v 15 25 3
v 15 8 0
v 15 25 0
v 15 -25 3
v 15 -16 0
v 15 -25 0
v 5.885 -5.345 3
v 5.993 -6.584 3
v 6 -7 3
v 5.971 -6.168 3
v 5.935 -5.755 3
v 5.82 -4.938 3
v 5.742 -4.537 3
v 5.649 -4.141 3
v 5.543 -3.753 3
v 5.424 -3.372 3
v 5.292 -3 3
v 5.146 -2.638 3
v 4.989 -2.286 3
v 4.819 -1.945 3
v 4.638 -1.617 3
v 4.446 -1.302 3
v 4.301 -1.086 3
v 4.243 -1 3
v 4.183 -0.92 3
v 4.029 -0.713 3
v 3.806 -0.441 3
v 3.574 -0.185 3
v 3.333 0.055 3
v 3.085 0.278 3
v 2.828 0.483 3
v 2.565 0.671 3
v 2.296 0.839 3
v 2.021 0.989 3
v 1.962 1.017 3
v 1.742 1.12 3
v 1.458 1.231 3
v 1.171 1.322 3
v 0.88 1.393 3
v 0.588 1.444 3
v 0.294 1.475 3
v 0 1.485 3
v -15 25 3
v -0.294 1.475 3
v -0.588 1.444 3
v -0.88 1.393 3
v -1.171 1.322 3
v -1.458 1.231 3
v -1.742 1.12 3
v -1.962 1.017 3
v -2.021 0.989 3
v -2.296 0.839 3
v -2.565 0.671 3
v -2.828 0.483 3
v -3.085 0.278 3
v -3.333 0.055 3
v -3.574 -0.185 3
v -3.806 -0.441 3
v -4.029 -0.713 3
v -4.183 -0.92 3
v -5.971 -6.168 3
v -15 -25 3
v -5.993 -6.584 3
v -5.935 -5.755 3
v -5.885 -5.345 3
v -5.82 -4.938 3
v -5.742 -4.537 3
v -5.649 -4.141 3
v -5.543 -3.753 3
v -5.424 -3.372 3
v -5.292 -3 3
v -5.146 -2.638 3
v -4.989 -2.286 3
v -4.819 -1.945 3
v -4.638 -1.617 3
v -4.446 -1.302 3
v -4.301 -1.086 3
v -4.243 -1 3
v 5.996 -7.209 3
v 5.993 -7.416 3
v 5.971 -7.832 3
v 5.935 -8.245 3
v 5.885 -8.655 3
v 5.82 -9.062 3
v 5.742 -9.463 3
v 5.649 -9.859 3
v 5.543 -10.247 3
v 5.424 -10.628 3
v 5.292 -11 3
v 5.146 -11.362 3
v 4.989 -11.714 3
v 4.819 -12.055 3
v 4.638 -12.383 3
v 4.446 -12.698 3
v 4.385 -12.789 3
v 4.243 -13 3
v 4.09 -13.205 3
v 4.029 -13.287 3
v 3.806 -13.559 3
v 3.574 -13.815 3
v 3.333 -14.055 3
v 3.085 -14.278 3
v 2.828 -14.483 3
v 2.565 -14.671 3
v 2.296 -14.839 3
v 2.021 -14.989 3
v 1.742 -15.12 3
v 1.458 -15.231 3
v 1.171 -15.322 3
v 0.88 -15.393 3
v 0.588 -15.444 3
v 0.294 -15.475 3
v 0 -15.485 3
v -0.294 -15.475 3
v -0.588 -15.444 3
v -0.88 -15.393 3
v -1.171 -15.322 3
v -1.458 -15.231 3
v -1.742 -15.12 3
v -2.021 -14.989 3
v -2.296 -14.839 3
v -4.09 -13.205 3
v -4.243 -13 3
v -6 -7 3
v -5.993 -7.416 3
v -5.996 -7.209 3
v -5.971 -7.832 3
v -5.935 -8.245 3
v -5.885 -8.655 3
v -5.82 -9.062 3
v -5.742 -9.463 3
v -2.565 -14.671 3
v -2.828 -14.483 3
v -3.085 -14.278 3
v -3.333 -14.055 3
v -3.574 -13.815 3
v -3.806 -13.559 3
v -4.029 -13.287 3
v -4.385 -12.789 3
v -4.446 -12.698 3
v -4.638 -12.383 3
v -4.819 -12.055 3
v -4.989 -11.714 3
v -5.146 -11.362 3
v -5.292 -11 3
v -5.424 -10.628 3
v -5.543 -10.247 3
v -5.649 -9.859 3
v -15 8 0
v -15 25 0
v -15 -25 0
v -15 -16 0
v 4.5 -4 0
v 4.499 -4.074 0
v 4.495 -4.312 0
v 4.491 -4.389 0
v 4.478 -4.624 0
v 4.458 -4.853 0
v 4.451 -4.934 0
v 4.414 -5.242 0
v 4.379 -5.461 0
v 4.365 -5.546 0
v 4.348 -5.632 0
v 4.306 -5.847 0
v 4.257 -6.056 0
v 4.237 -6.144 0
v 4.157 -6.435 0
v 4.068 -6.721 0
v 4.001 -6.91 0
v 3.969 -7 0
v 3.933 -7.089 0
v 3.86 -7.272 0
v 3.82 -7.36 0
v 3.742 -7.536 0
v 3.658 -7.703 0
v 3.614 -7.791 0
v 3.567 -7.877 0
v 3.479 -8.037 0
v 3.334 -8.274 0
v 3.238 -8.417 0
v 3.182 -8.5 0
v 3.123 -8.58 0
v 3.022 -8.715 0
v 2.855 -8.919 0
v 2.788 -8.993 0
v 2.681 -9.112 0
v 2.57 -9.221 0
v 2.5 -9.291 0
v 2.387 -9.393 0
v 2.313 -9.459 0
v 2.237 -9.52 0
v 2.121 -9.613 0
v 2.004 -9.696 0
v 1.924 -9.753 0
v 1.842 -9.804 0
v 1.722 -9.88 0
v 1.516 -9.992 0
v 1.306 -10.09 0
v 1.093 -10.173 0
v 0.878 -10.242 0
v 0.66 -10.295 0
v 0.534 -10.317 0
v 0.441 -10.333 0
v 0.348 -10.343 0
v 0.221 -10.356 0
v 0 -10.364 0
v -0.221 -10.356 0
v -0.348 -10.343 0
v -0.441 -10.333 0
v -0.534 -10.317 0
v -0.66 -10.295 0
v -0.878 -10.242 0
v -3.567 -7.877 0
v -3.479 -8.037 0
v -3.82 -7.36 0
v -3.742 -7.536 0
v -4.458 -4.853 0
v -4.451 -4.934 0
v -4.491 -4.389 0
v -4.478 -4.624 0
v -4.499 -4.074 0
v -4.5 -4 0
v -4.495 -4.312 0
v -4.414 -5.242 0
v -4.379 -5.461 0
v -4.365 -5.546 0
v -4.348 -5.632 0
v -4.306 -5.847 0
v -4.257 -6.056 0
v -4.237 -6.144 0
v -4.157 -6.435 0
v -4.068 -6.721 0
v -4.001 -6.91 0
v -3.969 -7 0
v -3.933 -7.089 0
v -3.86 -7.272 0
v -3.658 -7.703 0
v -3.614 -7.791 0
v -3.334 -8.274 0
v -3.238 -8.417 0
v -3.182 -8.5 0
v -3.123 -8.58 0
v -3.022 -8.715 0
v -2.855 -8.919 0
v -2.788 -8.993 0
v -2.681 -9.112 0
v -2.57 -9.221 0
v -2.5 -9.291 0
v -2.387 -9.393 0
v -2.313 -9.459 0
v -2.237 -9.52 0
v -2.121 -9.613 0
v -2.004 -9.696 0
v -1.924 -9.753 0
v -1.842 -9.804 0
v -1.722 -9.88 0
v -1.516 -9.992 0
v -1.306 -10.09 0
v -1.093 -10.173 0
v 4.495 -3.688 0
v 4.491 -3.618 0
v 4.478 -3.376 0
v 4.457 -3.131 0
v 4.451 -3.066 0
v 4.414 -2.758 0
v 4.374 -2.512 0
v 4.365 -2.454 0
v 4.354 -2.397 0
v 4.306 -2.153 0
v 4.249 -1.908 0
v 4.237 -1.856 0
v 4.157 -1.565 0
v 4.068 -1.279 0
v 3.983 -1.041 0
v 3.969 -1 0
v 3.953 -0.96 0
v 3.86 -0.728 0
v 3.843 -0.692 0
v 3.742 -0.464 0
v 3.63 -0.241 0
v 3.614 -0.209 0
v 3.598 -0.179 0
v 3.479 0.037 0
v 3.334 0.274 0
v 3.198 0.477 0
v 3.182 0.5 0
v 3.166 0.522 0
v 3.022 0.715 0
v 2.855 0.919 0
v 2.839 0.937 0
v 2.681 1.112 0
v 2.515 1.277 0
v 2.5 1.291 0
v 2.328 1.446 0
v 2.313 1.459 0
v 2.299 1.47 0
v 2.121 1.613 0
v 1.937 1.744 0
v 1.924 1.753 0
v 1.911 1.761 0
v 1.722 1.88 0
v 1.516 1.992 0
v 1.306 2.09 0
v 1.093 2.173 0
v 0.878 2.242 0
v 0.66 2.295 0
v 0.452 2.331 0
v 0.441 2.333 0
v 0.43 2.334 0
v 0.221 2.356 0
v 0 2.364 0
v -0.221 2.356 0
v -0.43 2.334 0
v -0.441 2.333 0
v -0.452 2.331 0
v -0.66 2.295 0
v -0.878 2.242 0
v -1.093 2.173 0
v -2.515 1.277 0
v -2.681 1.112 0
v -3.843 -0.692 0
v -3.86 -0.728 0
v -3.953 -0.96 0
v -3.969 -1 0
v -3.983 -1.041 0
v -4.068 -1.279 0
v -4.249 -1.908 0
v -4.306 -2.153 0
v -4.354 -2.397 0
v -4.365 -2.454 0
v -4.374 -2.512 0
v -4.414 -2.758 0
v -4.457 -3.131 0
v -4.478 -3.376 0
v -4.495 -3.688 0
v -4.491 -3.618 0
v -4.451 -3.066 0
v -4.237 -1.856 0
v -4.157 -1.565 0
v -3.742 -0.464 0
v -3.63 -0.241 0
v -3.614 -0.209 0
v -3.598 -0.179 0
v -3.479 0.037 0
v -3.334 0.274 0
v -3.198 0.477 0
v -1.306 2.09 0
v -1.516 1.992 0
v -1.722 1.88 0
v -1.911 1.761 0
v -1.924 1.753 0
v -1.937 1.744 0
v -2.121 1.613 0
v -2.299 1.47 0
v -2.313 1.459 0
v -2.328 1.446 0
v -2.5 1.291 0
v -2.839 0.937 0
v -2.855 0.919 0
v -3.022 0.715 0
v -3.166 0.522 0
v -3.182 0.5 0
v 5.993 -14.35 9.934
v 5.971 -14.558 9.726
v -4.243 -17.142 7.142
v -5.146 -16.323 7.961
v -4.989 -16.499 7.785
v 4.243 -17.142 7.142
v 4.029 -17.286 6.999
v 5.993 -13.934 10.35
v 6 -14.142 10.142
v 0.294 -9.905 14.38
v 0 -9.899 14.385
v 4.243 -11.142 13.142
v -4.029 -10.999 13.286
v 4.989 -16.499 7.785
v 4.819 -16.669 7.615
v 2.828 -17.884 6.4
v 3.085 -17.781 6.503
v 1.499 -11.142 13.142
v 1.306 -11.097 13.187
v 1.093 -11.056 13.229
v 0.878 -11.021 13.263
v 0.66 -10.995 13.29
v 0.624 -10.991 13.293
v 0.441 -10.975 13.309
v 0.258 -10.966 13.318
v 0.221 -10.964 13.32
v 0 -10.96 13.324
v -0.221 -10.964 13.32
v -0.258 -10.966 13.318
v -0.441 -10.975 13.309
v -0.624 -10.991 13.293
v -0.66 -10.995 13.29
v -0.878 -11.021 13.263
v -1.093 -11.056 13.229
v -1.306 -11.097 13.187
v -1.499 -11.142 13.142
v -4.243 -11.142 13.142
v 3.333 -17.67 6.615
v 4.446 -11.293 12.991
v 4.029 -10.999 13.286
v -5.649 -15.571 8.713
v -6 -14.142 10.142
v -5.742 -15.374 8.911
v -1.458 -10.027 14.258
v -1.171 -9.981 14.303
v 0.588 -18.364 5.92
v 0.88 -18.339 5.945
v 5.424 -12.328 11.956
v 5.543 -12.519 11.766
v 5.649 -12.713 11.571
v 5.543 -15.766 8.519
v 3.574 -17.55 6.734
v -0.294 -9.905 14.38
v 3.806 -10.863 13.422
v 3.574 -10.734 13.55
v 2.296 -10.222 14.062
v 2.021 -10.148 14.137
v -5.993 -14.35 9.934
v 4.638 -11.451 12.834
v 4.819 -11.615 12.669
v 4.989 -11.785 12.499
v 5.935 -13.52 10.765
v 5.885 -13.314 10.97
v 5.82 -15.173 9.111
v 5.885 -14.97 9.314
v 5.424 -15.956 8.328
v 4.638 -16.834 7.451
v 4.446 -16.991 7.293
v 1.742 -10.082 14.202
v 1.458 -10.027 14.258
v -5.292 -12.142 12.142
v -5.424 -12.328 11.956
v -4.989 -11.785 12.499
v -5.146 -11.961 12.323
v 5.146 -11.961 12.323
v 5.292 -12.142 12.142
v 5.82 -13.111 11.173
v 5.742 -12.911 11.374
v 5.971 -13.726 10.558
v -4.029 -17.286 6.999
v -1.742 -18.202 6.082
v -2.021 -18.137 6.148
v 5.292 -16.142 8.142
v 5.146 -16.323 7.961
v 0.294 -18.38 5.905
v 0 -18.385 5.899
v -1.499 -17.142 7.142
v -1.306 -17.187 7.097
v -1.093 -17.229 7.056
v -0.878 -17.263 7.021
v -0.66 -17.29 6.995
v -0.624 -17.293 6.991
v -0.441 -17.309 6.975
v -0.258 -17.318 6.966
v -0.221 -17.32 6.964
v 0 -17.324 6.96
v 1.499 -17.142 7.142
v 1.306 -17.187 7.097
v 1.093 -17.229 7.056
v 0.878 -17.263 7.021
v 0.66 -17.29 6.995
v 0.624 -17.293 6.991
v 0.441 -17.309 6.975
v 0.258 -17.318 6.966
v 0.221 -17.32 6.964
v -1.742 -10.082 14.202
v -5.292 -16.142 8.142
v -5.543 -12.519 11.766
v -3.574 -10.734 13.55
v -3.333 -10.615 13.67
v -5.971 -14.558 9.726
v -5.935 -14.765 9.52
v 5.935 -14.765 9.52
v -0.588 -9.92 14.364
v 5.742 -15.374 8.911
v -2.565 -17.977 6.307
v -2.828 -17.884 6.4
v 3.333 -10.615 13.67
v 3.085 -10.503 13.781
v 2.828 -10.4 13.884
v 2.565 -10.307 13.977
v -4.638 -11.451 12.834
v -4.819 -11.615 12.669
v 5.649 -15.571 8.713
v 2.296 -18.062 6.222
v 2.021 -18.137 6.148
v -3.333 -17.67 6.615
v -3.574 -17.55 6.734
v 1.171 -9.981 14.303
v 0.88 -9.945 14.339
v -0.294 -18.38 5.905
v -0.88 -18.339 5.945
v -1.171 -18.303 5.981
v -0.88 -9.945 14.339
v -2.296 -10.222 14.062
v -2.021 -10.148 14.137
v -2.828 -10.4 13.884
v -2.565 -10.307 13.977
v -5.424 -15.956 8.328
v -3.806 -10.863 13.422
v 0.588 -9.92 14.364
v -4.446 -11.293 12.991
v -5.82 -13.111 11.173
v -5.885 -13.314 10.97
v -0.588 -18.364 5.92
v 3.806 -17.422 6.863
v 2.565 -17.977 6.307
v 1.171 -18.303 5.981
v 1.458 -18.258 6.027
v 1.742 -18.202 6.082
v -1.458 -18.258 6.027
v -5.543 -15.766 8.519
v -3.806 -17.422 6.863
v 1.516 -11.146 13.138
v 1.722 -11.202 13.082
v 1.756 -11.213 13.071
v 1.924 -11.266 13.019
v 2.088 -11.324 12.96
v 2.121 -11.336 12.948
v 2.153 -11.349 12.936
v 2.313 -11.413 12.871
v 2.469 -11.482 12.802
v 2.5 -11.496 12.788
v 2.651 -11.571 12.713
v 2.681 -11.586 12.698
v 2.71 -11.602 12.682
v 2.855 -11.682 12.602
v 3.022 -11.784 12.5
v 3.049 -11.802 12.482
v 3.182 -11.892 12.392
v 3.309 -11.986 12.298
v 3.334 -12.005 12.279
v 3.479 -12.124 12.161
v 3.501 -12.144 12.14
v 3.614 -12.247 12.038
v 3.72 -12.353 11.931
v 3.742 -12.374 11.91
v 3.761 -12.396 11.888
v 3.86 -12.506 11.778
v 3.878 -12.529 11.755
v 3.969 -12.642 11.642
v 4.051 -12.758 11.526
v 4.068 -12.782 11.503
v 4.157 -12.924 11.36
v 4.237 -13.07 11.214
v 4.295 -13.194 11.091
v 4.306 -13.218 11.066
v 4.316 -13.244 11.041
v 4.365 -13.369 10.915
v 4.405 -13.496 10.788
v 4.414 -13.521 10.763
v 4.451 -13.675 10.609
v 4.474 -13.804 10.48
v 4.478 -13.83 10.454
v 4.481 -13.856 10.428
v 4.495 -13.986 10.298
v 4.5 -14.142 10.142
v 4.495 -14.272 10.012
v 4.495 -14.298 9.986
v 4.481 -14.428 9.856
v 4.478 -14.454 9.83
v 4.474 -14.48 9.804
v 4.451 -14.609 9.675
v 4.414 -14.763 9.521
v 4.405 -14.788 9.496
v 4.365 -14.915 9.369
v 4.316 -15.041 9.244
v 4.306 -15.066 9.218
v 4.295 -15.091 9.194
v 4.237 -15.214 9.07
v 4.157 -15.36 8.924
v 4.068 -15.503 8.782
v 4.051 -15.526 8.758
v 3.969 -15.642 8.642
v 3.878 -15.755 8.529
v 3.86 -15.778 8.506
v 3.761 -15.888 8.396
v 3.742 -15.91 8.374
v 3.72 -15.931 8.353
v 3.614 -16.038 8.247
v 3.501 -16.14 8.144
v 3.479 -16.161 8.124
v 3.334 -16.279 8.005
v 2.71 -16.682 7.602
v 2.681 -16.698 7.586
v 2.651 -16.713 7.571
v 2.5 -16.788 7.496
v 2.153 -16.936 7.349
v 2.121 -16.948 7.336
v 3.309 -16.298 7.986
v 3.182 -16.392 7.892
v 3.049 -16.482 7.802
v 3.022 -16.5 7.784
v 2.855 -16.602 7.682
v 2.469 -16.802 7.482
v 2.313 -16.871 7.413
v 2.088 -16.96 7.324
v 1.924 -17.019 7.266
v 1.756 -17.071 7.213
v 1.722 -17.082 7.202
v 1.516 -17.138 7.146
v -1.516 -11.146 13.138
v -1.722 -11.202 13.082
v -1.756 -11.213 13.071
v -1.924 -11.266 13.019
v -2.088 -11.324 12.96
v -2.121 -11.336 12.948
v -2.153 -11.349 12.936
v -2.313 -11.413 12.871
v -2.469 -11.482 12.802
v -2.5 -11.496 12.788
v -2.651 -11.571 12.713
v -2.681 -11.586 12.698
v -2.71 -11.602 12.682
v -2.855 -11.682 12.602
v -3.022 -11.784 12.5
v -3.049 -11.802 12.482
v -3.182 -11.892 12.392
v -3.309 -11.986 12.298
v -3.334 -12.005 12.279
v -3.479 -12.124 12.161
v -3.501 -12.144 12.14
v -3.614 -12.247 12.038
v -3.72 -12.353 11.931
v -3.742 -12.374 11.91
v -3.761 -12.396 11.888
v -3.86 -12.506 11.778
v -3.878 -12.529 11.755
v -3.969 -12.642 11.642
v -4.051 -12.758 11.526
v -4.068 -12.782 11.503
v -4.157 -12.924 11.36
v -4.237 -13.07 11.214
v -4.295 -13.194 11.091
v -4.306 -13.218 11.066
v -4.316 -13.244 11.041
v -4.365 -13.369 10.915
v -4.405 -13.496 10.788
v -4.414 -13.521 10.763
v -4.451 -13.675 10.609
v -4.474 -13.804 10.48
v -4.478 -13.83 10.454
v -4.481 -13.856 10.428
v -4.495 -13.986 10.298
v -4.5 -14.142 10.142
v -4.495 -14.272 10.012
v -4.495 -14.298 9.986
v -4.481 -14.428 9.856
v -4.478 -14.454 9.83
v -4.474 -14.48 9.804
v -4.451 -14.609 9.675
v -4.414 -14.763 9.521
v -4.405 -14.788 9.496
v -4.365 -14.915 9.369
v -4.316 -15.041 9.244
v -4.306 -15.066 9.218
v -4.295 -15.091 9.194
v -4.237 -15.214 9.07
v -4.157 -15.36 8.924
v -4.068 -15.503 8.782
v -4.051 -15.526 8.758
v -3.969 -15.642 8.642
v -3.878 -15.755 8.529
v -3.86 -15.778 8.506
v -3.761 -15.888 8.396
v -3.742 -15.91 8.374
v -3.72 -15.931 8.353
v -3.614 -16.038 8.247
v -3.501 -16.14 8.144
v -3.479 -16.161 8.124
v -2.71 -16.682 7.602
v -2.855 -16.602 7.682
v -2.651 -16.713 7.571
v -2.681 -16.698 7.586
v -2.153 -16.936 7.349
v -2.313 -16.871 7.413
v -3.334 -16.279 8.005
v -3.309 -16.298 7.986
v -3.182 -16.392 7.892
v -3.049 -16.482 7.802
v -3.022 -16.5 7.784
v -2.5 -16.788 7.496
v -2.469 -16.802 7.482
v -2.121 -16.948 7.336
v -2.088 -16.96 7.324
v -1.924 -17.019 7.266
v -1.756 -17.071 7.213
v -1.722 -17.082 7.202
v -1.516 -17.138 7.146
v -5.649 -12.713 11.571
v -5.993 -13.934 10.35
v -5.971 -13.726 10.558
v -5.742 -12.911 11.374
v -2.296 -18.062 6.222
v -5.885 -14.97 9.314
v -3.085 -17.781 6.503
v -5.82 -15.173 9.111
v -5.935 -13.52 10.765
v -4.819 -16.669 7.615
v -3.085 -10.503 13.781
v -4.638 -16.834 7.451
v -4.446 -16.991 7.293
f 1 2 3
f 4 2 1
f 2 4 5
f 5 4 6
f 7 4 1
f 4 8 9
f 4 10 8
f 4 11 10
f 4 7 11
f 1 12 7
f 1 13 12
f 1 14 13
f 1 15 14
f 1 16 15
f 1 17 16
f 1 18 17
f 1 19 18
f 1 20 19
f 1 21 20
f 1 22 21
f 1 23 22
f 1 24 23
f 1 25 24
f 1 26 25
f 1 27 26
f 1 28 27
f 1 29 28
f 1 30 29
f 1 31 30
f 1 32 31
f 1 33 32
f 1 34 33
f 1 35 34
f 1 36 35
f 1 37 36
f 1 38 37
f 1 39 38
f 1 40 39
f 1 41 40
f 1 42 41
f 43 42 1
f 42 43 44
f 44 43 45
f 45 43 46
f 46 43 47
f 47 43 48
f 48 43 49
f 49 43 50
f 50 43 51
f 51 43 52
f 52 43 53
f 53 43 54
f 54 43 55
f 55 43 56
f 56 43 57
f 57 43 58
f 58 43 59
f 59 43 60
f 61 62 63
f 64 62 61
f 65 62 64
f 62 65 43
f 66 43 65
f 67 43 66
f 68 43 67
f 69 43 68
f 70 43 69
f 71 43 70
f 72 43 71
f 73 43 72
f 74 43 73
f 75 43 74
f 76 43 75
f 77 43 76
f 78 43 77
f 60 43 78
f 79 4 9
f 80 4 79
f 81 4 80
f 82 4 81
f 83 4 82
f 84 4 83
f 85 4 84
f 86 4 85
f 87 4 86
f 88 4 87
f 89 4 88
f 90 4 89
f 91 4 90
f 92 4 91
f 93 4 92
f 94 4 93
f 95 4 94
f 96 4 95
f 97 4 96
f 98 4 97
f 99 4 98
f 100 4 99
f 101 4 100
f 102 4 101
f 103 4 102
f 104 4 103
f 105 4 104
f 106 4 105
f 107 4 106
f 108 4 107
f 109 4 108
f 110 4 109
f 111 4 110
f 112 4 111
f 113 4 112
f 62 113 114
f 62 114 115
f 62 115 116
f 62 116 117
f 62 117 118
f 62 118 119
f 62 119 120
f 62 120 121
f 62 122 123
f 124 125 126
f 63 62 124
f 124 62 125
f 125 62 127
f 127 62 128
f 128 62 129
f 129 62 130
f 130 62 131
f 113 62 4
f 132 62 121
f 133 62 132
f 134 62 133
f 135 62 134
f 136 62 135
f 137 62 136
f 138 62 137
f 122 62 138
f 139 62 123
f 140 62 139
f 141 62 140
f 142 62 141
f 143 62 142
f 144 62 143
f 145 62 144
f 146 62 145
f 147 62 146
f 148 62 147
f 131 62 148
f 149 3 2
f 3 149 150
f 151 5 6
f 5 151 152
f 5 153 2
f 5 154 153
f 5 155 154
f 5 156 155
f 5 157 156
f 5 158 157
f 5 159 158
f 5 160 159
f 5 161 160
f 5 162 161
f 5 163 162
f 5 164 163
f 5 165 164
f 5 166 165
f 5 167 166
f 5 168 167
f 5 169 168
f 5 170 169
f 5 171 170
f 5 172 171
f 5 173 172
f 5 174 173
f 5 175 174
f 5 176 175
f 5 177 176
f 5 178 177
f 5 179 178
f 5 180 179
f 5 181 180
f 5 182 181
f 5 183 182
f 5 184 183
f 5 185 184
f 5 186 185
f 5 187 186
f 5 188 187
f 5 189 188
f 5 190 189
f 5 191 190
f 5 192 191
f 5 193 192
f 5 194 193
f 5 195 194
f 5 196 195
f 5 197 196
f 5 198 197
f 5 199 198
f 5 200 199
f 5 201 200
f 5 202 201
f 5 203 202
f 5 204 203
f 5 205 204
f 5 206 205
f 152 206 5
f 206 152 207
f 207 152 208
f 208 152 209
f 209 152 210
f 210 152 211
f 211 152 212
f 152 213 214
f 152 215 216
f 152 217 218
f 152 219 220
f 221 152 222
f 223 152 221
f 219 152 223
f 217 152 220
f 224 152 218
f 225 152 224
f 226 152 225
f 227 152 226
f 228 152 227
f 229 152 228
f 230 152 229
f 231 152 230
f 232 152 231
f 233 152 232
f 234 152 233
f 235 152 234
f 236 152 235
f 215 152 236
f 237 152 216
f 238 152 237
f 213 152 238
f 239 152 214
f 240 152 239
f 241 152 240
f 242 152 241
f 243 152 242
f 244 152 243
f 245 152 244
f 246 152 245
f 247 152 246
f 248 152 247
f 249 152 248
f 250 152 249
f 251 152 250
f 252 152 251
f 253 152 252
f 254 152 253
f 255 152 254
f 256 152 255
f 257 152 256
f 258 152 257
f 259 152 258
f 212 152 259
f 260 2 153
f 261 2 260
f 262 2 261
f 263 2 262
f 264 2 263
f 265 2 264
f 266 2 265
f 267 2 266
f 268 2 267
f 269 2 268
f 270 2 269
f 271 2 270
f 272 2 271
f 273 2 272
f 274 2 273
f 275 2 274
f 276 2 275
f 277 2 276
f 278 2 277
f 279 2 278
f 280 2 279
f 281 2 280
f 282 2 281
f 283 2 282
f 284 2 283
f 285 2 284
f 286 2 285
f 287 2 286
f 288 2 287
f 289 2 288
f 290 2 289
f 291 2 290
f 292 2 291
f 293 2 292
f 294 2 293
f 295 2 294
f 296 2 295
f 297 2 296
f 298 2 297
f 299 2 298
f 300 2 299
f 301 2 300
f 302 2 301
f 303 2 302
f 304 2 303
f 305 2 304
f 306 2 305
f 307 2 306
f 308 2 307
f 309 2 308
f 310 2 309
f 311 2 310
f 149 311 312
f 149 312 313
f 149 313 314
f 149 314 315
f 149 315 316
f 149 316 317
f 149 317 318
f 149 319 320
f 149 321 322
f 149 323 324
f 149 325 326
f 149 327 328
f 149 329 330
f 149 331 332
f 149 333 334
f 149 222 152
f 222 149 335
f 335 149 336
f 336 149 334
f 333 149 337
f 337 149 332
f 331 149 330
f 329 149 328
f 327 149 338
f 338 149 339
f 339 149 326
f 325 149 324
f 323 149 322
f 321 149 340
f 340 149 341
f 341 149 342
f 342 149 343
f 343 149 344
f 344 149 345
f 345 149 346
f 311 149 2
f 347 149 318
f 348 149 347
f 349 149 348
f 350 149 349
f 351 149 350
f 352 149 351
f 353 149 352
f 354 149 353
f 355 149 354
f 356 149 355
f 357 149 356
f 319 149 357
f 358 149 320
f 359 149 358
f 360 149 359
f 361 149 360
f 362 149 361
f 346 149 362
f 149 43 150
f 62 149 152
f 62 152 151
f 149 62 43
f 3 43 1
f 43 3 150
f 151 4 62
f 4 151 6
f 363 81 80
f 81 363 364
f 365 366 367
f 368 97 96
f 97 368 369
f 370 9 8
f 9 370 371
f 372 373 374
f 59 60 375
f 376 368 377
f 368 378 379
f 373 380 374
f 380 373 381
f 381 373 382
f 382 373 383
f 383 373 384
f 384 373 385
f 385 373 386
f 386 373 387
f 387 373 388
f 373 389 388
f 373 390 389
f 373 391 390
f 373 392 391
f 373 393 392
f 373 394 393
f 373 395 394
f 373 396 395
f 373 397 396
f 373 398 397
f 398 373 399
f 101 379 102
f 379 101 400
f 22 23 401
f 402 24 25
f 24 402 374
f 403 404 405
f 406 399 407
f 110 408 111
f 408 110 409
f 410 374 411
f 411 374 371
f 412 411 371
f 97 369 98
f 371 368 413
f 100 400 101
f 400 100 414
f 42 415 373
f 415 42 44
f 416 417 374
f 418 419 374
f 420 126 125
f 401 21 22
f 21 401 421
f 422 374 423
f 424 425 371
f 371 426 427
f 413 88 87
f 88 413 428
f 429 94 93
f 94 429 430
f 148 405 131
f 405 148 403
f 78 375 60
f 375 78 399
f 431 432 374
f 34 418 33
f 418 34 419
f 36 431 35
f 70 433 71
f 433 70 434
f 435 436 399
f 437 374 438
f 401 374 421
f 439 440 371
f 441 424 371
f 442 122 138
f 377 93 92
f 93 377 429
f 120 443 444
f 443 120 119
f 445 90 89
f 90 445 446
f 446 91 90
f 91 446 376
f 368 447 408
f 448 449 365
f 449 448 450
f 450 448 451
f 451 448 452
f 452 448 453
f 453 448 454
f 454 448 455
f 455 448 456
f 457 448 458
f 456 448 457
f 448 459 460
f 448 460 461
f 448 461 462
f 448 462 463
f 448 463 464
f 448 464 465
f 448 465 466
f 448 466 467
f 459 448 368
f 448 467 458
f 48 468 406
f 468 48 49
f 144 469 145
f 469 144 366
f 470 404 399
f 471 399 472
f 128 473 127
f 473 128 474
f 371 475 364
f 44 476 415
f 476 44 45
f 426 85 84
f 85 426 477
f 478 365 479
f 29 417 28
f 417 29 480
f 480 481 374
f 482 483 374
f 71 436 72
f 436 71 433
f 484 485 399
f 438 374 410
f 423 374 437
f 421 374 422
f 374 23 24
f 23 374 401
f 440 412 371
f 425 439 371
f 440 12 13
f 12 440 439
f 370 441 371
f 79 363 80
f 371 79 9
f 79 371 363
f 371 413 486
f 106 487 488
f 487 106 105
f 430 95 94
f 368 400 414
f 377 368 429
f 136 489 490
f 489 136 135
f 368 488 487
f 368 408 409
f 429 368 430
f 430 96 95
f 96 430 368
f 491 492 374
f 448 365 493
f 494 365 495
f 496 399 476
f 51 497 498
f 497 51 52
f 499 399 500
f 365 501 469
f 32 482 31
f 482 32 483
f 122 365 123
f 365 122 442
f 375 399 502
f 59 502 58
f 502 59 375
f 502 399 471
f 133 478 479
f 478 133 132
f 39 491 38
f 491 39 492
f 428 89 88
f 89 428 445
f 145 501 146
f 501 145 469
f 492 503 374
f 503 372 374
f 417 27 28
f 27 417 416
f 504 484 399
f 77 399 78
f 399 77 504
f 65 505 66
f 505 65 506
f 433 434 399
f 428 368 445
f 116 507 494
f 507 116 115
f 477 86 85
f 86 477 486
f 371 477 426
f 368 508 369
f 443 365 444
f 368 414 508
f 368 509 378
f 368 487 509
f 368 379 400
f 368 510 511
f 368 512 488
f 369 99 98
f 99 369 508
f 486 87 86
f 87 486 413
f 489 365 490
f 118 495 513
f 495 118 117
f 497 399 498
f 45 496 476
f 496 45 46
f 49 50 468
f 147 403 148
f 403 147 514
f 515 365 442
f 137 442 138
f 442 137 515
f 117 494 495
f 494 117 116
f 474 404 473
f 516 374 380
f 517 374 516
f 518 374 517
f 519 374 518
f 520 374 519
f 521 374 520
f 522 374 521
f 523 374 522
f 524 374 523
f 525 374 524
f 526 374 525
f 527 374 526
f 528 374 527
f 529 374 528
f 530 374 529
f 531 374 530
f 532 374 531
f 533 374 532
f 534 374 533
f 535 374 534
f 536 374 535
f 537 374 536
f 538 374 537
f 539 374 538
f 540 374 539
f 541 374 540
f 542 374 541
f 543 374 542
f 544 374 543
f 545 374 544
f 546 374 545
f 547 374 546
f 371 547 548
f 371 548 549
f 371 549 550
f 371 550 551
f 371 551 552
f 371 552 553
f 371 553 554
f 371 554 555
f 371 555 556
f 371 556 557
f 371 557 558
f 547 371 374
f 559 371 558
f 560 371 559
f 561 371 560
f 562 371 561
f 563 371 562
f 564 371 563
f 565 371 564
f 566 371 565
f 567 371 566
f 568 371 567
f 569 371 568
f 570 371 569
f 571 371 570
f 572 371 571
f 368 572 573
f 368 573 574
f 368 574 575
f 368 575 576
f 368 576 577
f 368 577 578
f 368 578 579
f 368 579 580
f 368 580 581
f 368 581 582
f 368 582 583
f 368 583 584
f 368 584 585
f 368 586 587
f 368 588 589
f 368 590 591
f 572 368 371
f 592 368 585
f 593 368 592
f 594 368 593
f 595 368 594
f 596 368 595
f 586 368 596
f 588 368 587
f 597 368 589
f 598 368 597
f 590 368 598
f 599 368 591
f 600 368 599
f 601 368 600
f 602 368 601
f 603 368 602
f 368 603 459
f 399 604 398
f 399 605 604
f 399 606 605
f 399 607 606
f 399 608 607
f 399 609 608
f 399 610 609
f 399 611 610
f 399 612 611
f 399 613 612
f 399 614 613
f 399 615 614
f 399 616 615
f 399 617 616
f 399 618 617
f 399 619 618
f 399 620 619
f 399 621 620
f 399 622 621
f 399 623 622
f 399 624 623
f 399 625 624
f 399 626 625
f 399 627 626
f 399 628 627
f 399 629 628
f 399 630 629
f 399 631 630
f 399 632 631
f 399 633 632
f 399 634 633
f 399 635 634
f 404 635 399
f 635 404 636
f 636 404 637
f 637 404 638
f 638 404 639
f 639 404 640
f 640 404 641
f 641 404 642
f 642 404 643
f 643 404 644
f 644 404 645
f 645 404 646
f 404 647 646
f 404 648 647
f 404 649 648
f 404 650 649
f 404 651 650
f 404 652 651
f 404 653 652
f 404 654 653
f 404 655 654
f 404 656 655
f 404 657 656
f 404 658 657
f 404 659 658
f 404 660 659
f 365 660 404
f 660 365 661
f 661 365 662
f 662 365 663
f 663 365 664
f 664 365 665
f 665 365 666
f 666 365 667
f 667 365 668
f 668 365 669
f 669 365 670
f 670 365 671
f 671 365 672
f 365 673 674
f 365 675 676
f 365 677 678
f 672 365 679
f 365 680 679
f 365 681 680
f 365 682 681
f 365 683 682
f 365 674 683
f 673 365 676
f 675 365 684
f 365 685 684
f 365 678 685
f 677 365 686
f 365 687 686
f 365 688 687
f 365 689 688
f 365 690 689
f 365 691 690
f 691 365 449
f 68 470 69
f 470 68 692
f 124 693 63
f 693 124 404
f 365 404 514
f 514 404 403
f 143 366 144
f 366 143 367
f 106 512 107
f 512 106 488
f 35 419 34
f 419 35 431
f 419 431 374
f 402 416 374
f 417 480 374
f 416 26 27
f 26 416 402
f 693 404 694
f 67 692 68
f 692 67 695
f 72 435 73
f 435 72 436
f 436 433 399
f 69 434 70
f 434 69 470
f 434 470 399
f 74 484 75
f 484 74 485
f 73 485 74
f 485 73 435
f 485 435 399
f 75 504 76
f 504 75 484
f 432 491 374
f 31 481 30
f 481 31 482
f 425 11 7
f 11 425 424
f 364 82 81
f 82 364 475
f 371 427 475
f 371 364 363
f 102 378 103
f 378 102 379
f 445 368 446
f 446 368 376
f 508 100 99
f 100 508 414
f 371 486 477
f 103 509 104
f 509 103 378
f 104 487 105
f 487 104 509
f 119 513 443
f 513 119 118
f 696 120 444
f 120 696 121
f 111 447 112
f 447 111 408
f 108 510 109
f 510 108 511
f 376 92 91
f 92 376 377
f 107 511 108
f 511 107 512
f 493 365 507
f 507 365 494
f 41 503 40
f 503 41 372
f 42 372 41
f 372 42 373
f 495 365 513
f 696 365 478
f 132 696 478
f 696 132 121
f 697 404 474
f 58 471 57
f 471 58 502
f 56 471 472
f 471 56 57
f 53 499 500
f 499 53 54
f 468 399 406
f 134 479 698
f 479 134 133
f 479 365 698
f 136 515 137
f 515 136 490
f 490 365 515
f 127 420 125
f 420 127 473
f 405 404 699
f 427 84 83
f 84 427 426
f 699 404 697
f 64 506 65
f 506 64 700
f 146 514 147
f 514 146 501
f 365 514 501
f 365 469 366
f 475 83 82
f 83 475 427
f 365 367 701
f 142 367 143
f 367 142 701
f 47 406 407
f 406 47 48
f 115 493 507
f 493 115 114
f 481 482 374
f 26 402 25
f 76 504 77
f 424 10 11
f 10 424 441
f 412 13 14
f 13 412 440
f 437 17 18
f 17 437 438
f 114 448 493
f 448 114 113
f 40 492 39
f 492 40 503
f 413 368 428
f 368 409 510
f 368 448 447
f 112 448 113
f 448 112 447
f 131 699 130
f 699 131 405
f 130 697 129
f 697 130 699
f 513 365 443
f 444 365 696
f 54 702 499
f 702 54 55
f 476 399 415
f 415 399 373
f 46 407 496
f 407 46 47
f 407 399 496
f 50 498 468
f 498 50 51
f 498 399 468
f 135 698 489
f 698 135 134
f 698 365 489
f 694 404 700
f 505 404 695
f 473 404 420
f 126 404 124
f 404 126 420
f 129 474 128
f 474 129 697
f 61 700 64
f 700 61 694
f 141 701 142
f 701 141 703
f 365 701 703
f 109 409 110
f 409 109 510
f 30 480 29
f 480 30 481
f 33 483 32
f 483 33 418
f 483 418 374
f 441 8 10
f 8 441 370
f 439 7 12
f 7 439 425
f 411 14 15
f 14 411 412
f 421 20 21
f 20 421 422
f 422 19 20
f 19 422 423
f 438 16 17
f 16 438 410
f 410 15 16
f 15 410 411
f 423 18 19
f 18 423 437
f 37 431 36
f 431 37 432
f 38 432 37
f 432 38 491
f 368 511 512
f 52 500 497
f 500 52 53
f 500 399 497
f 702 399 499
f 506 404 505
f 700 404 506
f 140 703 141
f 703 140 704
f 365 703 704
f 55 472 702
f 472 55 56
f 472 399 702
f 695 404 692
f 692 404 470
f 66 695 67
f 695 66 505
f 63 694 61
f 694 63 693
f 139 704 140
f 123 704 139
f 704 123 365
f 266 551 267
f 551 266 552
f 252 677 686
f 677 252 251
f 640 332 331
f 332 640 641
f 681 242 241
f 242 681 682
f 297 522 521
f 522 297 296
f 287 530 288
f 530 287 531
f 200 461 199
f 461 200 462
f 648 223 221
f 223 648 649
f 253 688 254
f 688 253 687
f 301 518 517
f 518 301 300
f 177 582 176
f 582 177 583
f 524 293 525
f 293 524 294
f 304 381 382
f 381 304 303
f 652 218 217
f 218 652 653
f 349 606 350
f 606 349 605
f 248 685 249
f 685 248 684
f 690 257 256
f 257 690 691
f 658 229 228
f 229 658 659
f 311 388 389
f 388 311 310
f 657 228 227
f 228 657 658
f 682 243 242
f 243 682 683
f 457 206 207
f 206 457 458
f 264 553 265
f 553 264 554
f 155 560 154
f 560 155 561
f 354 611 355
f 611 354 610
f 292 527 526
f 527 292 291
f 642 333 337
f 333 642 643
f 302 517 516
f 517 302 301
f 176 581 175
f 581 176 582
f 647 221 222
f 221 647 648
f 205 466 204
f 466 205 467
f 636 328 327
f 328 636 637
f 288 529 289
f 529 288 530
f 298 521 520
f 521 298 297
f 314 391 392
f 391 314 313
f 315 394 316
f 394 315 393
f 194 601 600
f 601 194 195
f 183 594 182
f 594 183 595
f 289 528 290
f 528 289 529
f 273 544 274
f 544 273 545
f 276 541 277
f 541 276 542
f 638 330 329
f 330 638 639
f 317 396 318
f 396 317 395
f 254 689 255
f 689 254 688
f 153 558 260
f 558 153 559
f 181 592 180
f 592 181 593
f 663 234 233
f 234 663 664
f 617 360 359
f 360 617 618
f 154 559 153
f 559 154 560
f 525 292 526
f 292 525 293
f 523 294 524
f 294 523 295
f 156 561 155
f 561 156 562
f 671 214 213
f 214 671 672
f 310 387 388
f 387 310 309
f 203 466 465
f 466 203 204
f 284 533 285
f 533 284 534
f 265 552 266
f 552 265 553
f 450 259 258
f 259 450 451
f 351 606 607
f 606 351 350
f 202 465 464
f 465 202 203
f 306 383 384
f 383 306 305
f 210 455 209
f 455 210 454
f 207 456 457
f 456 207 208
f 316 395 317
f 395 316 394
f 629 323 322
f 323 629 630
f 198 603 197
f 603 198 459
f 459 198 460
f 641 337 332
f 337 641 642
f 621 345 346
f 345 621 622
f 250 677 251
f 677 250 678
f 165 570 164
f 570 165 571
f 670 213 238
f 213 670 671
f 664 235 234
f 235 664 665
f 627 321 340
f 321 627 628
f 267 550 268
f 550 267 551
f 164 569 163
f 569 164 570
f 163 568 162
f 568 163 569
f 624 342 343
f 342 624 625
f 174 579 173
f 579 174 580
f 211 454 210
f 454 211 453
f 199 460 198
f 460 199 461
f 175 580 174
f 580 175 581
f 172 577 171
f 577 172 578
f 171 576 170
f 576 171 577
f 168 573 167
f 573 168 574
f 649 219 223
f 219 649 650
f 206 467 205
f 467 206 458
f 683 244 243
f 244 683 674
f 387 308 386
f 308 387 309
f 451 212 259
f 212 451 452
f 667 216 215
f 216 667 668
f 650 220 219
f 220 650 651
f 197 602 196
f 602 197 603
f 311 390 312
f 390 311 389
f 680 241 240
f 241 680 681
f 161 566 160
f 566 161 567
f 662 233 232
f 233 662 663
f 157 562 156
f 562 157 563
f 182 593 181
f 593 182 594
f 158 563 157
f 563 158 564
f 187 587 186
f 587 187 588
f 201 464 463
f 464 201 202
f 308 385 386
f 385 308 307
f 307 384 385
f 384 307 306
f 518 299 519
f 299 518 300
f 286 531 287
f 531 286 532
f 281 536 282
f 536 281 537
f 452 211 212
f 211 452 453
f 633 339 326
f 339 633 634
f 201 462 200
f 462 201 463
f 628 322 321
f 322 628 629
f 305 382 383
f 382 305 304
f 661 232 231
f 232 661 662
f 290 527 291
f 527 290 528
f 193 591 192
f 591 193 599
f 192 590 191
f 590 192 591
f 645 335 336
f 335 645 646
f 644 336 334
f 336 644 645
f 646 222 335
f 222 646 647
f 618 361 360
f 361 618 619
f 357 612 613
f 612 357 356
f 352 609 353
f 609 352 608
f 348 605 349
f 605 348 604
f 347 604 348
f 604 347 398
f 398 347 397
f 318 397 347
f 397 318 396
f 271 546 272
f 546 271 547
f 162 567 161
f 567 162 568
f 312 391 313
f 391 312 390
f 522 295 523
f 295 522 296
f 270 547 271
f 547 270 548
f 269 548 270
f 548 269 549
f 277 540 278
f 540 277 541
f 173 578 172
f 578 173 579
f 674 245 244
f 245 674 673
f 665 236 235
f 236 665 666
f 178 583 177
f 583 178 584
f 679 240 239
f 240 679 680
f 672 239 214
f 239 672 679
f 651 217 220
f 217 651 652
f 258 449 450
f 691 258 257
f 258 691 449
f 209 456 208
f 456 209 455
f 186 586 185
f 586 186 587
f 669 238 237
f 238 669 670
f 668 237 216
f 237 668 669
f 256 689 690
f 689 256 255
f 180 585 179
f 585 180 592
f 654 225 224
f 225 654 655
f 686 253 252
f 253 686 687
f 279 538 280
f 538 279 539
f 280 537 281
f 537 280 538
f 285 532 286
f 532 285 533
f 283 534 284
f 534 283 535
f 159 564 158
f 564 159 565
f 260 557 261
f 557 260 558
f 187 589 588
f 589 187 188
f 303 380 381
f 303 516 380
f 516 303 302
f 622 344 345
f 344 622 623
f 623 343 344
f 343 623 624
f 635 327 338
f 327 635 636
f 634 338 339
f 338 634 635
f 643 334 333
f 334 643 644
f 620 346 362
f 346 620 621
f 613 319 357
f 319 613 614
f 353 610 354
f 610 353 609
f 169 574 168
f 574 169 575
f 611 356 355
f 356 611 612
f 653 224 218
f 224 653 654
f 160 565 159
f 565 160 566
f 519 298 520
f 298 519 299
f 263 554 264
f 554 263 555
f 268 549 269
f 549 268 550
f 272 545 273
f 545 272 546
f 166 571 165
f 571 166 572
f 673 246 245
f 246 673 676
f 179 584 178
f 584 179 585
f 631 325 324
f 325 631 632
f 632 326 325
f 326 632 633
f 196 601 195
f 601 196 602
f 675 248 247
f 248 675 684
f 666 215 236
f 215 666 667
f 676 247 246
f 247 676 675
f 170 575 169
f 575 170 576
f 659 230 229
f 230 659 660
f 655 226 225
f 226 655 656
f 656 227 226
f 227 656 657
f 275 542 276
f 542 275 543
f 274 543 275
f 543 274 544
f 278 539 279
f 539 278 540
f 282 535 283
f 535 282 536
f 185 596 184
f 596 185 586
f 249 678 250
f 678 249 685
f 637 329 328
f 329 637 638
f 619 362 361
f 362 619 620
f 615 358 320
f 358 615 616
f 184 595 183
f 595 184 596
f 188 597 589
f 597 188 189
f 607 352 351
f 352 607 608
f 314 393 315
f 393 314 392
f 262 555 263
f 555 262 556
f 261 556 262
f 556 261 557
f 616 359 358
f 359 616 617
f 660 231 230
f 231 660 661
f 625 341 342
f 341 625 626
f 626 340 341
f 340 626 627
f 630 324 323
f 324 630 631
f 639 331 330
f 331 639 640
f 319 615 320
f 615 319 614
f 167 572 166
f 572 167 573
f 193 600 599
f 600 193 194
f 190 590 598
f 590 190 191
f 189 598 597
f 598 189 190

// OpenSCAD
overlap=0.001;
$fn=128;

// panel dimensions
pwidth=30;
pthick=3;
pheight=50;

// tube dimensions
tlength=20;
tOD = 12;
tID = 9;
tube_protrude=4;

clipfrontdepth=10;


panelwithhole();
// hole();
//clipfront();

module panelwithhole()
{
    difference()
    {
        union()
        {
            panel();
            
            translate([0,0,-tube_protrude])
            rotate([45,0,0])
            tube();
        }
        
        clipfront();
        
        translate([0,0,-tube_protrude])
        rotate([45,0,0])
        hole();
    }
}

module panel()
{
    translate([0,0,pthick/2])
    cube(size=[pwidth,pheight,pthick], center=true);
}

module tube()
{
    cylinder(h=tlength, d=tOD);
}

module hole()
{
    cylinder(h=tlength+pthick+1, d=tID);
}

module clipfront()
{
    translate([0,-tube_protrude,-clipfrontdepth/2])
    cube(size=[pwidth,tOD*2,clipfrontdepth], center=true);
}
